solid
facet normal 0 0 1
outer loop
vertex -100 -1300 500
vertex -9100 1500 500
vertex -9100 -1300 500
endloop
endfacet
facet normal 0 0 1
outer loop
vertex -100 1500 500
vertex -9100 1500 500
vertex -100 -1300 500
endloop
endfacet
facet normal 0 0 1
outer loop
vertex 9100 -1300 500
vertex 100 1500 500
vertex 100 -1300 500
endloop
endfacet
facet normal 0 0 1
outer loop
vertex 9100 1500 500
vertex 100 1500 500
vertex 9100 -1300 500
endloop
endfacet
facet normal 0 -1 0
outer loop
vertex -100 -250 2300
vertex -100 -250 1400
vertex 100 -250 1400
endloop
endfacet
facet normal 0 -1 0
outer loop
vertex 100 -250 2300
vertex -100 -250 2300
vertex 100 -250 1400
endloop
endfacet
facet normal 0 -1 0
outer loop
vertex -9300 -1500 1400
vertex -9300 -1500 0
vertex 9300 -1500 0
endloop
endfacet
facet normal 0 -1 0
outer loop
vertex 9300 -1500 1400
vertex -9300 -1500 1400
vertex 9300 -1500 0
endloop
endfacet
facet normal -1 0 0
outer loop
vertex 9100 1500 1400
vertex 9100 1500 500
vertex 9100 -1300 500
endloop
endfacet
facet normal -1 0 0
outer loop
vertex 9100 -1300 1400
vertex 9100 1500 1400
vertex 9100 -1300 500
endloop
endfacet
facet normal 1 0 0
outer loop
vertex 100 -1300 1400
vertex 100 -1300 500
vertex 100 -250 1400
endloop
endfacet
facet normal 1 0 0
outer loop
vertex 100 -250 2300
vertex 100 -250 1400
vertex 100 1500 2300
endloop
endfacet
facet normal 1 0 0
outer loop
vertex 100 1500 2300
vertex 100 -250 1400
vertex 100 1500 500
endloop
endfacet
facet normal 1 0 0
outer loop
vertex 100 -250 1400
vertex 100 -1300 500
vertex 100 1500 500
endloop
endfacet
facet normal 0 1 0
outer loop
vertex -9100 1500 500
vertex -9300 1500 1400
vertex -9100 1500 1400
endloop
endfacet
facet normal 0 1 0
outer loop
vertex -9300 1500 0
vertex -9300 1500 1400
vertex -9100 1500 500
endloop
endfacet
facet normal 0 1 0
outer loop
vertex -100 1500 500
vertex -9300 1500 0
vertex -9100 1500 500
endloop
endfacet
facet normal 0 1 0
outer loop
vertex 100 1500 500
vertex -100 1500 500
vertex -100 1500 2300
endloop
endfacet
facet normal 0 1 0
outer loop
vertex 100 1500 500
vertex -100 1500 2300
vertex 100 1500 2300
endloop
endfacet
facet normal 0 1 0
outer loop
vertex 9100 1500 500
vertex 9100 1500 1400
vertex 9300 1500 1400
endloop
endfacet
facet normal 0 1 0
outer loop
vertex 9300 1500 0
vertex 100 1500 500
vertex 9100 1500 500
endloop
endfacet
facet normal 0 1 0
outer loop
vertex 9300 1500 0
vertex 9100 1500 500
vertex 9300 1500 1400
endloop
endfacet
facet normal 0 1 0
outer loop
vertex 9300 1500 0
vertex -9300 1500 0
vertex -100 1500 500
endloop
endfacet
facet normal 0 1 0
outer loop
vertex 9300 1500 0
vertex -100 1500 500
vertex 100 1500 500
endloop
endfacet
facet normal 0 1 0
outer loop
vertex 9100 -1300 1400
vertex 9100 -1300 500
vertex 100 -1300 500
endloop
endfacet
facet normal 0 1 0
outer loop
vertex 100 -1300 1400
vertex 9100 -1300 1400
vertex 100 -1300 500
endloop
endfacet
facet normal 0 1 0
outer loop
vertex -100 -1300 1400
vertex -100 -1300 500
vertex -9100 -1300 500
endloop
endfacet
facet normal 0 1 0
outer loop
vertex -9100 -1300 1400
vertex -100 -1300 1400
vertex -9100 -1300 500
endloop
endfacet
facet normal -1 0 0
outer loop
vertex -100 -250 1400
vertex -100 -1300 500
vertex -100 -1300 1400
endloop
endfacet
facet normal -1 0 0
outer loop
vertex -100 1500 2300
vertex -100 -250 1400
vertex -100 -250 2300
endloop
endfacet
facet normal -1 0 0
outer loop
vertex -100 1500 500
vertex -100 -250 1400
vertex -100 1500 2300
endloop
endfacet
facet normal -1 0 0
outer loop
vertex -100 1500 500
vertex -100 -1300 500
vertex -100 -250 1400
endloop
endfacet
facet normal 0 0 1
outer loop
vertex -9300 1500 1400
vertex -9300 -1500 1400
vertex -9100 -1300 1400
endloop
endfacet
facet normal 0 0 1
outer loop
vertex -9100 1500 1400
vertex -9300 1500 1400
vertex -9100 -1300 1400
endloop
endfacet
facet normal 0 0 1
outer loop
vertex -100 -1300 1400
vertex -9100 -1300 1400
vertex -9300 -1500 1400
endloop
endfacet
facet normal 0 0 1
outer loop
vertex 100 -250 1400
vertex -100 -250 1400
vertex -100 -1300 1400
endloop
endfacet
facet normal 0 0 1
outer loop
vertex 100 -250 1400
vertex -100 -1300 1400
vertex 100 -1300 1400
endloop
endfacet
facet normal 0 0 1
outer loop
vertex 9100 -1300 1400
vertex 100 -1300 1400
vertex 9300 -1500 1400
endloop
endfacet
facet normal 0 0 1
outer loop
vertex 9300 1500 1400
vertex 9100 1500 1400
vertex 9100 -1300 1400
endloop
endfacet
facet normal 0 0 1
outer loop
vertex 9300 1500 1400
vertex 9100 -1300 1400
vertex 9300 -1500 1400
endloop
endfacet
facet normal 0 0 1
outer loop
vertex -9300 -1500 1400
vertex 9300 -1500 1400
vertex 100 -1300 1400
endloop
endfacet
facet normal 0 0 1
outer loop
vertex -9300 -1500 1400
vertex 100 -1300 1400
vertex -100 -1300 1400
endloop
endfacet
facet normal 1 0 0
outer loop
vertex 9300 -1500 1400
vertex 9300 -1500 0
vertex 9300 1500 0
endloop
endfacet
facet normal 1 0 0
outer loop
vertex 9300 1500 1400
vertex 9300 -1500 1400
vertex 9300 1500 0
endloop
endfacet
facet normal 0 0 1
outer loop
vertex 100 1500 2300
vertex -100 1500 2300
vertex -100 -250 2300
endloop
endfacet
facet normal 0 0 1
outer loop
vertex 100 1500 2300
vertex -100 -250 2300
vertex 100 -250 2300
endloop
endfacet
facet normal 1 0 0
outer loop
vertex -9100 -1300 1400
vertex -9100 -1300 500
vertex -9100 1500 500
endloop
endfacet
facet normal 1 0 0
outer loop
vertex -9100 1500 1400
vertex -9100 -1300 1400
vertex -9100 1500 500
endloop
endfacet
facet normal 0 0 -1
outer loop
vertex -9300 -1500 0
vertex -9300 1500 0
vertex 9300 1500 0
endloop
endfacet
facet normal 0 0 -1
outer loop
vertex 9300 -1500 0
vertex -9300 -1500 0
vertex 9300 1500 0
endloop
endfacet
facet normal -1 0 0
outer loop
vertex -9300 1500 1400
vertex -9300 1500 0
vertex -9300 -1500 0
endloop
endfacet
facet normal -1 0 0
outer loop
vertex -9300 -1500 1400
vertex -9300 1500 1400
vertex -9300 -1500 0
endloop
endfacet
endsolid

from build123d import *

# Parameters (mm, degrees)
F1_DEPTH = 500
F0_W     = 9000
F0_H     = 200
F0_W_2   = 200
F0_H_2   = 1050
F2_DEPTH = 1400
F0_H_3   = 1750
F3_DEPTH = 2300


with BuildPart() as f1:
    # F0 (on Top) → F1 (new body)
    with BuildSketch(Plane.XY):
        Polygon((-100, -250), (-100, 1500), (-9100, 1500), (-9100, -1300), (-100, -1300), align=None)
    extrude(amount=F1_DEPTH)



with BuildPart() as f1b:
    # F0 (on Top) → F1, piece 2 (new body)
    with BuildSketch(Plane.XY):
        Polygon((9100, -1300), (9100, 1500), (100, 1500), (100, -250), (100, -1300), align=None)
    extrude(amount=F1_DEPTH)


with BuildPart() as f2:
    # F0 (on Top) → F2 (new body)
    with BuildSketch(Plane.XY):
        Polygon((-9100, -1300), (-9100, 1500), (-9300, 1500), (-9300, -1500), (-9100, -1500), align=None)
        with Locations((-4600, -1400)):
            Rectangle(F0_W, F0_H)
        Polygon((9300, -1500), (9300, 1500), (9100, 1500), (9100, -1300), (9100, -1500), align=None)
        with Locations((4600, -1400)):
            Rectangle(F0_W, F0_H)
        with Locations((0, -1400)):
            Rectangle(F0_W_2, F0_H)
        with Locations((0, -775)):
            Rectangle(F0_W_2, F0_H_2)
    extrude(amount=F2_DEPTH)


with BuildPart() as f1_1:
    add(f1.part)

    add(f1b.part)  # F3 merges F1b

    add(f2.part)  # F3 merges F2
    # F0 (on Top) → F3 (join)
    with BuildSketch(Plane.XY):
        with Locations((0, 625)):
            Rectangle(F0_W_2, F0_H_3)
    extrude(amount=F3_DEPTH)


solid = f1_1.part
